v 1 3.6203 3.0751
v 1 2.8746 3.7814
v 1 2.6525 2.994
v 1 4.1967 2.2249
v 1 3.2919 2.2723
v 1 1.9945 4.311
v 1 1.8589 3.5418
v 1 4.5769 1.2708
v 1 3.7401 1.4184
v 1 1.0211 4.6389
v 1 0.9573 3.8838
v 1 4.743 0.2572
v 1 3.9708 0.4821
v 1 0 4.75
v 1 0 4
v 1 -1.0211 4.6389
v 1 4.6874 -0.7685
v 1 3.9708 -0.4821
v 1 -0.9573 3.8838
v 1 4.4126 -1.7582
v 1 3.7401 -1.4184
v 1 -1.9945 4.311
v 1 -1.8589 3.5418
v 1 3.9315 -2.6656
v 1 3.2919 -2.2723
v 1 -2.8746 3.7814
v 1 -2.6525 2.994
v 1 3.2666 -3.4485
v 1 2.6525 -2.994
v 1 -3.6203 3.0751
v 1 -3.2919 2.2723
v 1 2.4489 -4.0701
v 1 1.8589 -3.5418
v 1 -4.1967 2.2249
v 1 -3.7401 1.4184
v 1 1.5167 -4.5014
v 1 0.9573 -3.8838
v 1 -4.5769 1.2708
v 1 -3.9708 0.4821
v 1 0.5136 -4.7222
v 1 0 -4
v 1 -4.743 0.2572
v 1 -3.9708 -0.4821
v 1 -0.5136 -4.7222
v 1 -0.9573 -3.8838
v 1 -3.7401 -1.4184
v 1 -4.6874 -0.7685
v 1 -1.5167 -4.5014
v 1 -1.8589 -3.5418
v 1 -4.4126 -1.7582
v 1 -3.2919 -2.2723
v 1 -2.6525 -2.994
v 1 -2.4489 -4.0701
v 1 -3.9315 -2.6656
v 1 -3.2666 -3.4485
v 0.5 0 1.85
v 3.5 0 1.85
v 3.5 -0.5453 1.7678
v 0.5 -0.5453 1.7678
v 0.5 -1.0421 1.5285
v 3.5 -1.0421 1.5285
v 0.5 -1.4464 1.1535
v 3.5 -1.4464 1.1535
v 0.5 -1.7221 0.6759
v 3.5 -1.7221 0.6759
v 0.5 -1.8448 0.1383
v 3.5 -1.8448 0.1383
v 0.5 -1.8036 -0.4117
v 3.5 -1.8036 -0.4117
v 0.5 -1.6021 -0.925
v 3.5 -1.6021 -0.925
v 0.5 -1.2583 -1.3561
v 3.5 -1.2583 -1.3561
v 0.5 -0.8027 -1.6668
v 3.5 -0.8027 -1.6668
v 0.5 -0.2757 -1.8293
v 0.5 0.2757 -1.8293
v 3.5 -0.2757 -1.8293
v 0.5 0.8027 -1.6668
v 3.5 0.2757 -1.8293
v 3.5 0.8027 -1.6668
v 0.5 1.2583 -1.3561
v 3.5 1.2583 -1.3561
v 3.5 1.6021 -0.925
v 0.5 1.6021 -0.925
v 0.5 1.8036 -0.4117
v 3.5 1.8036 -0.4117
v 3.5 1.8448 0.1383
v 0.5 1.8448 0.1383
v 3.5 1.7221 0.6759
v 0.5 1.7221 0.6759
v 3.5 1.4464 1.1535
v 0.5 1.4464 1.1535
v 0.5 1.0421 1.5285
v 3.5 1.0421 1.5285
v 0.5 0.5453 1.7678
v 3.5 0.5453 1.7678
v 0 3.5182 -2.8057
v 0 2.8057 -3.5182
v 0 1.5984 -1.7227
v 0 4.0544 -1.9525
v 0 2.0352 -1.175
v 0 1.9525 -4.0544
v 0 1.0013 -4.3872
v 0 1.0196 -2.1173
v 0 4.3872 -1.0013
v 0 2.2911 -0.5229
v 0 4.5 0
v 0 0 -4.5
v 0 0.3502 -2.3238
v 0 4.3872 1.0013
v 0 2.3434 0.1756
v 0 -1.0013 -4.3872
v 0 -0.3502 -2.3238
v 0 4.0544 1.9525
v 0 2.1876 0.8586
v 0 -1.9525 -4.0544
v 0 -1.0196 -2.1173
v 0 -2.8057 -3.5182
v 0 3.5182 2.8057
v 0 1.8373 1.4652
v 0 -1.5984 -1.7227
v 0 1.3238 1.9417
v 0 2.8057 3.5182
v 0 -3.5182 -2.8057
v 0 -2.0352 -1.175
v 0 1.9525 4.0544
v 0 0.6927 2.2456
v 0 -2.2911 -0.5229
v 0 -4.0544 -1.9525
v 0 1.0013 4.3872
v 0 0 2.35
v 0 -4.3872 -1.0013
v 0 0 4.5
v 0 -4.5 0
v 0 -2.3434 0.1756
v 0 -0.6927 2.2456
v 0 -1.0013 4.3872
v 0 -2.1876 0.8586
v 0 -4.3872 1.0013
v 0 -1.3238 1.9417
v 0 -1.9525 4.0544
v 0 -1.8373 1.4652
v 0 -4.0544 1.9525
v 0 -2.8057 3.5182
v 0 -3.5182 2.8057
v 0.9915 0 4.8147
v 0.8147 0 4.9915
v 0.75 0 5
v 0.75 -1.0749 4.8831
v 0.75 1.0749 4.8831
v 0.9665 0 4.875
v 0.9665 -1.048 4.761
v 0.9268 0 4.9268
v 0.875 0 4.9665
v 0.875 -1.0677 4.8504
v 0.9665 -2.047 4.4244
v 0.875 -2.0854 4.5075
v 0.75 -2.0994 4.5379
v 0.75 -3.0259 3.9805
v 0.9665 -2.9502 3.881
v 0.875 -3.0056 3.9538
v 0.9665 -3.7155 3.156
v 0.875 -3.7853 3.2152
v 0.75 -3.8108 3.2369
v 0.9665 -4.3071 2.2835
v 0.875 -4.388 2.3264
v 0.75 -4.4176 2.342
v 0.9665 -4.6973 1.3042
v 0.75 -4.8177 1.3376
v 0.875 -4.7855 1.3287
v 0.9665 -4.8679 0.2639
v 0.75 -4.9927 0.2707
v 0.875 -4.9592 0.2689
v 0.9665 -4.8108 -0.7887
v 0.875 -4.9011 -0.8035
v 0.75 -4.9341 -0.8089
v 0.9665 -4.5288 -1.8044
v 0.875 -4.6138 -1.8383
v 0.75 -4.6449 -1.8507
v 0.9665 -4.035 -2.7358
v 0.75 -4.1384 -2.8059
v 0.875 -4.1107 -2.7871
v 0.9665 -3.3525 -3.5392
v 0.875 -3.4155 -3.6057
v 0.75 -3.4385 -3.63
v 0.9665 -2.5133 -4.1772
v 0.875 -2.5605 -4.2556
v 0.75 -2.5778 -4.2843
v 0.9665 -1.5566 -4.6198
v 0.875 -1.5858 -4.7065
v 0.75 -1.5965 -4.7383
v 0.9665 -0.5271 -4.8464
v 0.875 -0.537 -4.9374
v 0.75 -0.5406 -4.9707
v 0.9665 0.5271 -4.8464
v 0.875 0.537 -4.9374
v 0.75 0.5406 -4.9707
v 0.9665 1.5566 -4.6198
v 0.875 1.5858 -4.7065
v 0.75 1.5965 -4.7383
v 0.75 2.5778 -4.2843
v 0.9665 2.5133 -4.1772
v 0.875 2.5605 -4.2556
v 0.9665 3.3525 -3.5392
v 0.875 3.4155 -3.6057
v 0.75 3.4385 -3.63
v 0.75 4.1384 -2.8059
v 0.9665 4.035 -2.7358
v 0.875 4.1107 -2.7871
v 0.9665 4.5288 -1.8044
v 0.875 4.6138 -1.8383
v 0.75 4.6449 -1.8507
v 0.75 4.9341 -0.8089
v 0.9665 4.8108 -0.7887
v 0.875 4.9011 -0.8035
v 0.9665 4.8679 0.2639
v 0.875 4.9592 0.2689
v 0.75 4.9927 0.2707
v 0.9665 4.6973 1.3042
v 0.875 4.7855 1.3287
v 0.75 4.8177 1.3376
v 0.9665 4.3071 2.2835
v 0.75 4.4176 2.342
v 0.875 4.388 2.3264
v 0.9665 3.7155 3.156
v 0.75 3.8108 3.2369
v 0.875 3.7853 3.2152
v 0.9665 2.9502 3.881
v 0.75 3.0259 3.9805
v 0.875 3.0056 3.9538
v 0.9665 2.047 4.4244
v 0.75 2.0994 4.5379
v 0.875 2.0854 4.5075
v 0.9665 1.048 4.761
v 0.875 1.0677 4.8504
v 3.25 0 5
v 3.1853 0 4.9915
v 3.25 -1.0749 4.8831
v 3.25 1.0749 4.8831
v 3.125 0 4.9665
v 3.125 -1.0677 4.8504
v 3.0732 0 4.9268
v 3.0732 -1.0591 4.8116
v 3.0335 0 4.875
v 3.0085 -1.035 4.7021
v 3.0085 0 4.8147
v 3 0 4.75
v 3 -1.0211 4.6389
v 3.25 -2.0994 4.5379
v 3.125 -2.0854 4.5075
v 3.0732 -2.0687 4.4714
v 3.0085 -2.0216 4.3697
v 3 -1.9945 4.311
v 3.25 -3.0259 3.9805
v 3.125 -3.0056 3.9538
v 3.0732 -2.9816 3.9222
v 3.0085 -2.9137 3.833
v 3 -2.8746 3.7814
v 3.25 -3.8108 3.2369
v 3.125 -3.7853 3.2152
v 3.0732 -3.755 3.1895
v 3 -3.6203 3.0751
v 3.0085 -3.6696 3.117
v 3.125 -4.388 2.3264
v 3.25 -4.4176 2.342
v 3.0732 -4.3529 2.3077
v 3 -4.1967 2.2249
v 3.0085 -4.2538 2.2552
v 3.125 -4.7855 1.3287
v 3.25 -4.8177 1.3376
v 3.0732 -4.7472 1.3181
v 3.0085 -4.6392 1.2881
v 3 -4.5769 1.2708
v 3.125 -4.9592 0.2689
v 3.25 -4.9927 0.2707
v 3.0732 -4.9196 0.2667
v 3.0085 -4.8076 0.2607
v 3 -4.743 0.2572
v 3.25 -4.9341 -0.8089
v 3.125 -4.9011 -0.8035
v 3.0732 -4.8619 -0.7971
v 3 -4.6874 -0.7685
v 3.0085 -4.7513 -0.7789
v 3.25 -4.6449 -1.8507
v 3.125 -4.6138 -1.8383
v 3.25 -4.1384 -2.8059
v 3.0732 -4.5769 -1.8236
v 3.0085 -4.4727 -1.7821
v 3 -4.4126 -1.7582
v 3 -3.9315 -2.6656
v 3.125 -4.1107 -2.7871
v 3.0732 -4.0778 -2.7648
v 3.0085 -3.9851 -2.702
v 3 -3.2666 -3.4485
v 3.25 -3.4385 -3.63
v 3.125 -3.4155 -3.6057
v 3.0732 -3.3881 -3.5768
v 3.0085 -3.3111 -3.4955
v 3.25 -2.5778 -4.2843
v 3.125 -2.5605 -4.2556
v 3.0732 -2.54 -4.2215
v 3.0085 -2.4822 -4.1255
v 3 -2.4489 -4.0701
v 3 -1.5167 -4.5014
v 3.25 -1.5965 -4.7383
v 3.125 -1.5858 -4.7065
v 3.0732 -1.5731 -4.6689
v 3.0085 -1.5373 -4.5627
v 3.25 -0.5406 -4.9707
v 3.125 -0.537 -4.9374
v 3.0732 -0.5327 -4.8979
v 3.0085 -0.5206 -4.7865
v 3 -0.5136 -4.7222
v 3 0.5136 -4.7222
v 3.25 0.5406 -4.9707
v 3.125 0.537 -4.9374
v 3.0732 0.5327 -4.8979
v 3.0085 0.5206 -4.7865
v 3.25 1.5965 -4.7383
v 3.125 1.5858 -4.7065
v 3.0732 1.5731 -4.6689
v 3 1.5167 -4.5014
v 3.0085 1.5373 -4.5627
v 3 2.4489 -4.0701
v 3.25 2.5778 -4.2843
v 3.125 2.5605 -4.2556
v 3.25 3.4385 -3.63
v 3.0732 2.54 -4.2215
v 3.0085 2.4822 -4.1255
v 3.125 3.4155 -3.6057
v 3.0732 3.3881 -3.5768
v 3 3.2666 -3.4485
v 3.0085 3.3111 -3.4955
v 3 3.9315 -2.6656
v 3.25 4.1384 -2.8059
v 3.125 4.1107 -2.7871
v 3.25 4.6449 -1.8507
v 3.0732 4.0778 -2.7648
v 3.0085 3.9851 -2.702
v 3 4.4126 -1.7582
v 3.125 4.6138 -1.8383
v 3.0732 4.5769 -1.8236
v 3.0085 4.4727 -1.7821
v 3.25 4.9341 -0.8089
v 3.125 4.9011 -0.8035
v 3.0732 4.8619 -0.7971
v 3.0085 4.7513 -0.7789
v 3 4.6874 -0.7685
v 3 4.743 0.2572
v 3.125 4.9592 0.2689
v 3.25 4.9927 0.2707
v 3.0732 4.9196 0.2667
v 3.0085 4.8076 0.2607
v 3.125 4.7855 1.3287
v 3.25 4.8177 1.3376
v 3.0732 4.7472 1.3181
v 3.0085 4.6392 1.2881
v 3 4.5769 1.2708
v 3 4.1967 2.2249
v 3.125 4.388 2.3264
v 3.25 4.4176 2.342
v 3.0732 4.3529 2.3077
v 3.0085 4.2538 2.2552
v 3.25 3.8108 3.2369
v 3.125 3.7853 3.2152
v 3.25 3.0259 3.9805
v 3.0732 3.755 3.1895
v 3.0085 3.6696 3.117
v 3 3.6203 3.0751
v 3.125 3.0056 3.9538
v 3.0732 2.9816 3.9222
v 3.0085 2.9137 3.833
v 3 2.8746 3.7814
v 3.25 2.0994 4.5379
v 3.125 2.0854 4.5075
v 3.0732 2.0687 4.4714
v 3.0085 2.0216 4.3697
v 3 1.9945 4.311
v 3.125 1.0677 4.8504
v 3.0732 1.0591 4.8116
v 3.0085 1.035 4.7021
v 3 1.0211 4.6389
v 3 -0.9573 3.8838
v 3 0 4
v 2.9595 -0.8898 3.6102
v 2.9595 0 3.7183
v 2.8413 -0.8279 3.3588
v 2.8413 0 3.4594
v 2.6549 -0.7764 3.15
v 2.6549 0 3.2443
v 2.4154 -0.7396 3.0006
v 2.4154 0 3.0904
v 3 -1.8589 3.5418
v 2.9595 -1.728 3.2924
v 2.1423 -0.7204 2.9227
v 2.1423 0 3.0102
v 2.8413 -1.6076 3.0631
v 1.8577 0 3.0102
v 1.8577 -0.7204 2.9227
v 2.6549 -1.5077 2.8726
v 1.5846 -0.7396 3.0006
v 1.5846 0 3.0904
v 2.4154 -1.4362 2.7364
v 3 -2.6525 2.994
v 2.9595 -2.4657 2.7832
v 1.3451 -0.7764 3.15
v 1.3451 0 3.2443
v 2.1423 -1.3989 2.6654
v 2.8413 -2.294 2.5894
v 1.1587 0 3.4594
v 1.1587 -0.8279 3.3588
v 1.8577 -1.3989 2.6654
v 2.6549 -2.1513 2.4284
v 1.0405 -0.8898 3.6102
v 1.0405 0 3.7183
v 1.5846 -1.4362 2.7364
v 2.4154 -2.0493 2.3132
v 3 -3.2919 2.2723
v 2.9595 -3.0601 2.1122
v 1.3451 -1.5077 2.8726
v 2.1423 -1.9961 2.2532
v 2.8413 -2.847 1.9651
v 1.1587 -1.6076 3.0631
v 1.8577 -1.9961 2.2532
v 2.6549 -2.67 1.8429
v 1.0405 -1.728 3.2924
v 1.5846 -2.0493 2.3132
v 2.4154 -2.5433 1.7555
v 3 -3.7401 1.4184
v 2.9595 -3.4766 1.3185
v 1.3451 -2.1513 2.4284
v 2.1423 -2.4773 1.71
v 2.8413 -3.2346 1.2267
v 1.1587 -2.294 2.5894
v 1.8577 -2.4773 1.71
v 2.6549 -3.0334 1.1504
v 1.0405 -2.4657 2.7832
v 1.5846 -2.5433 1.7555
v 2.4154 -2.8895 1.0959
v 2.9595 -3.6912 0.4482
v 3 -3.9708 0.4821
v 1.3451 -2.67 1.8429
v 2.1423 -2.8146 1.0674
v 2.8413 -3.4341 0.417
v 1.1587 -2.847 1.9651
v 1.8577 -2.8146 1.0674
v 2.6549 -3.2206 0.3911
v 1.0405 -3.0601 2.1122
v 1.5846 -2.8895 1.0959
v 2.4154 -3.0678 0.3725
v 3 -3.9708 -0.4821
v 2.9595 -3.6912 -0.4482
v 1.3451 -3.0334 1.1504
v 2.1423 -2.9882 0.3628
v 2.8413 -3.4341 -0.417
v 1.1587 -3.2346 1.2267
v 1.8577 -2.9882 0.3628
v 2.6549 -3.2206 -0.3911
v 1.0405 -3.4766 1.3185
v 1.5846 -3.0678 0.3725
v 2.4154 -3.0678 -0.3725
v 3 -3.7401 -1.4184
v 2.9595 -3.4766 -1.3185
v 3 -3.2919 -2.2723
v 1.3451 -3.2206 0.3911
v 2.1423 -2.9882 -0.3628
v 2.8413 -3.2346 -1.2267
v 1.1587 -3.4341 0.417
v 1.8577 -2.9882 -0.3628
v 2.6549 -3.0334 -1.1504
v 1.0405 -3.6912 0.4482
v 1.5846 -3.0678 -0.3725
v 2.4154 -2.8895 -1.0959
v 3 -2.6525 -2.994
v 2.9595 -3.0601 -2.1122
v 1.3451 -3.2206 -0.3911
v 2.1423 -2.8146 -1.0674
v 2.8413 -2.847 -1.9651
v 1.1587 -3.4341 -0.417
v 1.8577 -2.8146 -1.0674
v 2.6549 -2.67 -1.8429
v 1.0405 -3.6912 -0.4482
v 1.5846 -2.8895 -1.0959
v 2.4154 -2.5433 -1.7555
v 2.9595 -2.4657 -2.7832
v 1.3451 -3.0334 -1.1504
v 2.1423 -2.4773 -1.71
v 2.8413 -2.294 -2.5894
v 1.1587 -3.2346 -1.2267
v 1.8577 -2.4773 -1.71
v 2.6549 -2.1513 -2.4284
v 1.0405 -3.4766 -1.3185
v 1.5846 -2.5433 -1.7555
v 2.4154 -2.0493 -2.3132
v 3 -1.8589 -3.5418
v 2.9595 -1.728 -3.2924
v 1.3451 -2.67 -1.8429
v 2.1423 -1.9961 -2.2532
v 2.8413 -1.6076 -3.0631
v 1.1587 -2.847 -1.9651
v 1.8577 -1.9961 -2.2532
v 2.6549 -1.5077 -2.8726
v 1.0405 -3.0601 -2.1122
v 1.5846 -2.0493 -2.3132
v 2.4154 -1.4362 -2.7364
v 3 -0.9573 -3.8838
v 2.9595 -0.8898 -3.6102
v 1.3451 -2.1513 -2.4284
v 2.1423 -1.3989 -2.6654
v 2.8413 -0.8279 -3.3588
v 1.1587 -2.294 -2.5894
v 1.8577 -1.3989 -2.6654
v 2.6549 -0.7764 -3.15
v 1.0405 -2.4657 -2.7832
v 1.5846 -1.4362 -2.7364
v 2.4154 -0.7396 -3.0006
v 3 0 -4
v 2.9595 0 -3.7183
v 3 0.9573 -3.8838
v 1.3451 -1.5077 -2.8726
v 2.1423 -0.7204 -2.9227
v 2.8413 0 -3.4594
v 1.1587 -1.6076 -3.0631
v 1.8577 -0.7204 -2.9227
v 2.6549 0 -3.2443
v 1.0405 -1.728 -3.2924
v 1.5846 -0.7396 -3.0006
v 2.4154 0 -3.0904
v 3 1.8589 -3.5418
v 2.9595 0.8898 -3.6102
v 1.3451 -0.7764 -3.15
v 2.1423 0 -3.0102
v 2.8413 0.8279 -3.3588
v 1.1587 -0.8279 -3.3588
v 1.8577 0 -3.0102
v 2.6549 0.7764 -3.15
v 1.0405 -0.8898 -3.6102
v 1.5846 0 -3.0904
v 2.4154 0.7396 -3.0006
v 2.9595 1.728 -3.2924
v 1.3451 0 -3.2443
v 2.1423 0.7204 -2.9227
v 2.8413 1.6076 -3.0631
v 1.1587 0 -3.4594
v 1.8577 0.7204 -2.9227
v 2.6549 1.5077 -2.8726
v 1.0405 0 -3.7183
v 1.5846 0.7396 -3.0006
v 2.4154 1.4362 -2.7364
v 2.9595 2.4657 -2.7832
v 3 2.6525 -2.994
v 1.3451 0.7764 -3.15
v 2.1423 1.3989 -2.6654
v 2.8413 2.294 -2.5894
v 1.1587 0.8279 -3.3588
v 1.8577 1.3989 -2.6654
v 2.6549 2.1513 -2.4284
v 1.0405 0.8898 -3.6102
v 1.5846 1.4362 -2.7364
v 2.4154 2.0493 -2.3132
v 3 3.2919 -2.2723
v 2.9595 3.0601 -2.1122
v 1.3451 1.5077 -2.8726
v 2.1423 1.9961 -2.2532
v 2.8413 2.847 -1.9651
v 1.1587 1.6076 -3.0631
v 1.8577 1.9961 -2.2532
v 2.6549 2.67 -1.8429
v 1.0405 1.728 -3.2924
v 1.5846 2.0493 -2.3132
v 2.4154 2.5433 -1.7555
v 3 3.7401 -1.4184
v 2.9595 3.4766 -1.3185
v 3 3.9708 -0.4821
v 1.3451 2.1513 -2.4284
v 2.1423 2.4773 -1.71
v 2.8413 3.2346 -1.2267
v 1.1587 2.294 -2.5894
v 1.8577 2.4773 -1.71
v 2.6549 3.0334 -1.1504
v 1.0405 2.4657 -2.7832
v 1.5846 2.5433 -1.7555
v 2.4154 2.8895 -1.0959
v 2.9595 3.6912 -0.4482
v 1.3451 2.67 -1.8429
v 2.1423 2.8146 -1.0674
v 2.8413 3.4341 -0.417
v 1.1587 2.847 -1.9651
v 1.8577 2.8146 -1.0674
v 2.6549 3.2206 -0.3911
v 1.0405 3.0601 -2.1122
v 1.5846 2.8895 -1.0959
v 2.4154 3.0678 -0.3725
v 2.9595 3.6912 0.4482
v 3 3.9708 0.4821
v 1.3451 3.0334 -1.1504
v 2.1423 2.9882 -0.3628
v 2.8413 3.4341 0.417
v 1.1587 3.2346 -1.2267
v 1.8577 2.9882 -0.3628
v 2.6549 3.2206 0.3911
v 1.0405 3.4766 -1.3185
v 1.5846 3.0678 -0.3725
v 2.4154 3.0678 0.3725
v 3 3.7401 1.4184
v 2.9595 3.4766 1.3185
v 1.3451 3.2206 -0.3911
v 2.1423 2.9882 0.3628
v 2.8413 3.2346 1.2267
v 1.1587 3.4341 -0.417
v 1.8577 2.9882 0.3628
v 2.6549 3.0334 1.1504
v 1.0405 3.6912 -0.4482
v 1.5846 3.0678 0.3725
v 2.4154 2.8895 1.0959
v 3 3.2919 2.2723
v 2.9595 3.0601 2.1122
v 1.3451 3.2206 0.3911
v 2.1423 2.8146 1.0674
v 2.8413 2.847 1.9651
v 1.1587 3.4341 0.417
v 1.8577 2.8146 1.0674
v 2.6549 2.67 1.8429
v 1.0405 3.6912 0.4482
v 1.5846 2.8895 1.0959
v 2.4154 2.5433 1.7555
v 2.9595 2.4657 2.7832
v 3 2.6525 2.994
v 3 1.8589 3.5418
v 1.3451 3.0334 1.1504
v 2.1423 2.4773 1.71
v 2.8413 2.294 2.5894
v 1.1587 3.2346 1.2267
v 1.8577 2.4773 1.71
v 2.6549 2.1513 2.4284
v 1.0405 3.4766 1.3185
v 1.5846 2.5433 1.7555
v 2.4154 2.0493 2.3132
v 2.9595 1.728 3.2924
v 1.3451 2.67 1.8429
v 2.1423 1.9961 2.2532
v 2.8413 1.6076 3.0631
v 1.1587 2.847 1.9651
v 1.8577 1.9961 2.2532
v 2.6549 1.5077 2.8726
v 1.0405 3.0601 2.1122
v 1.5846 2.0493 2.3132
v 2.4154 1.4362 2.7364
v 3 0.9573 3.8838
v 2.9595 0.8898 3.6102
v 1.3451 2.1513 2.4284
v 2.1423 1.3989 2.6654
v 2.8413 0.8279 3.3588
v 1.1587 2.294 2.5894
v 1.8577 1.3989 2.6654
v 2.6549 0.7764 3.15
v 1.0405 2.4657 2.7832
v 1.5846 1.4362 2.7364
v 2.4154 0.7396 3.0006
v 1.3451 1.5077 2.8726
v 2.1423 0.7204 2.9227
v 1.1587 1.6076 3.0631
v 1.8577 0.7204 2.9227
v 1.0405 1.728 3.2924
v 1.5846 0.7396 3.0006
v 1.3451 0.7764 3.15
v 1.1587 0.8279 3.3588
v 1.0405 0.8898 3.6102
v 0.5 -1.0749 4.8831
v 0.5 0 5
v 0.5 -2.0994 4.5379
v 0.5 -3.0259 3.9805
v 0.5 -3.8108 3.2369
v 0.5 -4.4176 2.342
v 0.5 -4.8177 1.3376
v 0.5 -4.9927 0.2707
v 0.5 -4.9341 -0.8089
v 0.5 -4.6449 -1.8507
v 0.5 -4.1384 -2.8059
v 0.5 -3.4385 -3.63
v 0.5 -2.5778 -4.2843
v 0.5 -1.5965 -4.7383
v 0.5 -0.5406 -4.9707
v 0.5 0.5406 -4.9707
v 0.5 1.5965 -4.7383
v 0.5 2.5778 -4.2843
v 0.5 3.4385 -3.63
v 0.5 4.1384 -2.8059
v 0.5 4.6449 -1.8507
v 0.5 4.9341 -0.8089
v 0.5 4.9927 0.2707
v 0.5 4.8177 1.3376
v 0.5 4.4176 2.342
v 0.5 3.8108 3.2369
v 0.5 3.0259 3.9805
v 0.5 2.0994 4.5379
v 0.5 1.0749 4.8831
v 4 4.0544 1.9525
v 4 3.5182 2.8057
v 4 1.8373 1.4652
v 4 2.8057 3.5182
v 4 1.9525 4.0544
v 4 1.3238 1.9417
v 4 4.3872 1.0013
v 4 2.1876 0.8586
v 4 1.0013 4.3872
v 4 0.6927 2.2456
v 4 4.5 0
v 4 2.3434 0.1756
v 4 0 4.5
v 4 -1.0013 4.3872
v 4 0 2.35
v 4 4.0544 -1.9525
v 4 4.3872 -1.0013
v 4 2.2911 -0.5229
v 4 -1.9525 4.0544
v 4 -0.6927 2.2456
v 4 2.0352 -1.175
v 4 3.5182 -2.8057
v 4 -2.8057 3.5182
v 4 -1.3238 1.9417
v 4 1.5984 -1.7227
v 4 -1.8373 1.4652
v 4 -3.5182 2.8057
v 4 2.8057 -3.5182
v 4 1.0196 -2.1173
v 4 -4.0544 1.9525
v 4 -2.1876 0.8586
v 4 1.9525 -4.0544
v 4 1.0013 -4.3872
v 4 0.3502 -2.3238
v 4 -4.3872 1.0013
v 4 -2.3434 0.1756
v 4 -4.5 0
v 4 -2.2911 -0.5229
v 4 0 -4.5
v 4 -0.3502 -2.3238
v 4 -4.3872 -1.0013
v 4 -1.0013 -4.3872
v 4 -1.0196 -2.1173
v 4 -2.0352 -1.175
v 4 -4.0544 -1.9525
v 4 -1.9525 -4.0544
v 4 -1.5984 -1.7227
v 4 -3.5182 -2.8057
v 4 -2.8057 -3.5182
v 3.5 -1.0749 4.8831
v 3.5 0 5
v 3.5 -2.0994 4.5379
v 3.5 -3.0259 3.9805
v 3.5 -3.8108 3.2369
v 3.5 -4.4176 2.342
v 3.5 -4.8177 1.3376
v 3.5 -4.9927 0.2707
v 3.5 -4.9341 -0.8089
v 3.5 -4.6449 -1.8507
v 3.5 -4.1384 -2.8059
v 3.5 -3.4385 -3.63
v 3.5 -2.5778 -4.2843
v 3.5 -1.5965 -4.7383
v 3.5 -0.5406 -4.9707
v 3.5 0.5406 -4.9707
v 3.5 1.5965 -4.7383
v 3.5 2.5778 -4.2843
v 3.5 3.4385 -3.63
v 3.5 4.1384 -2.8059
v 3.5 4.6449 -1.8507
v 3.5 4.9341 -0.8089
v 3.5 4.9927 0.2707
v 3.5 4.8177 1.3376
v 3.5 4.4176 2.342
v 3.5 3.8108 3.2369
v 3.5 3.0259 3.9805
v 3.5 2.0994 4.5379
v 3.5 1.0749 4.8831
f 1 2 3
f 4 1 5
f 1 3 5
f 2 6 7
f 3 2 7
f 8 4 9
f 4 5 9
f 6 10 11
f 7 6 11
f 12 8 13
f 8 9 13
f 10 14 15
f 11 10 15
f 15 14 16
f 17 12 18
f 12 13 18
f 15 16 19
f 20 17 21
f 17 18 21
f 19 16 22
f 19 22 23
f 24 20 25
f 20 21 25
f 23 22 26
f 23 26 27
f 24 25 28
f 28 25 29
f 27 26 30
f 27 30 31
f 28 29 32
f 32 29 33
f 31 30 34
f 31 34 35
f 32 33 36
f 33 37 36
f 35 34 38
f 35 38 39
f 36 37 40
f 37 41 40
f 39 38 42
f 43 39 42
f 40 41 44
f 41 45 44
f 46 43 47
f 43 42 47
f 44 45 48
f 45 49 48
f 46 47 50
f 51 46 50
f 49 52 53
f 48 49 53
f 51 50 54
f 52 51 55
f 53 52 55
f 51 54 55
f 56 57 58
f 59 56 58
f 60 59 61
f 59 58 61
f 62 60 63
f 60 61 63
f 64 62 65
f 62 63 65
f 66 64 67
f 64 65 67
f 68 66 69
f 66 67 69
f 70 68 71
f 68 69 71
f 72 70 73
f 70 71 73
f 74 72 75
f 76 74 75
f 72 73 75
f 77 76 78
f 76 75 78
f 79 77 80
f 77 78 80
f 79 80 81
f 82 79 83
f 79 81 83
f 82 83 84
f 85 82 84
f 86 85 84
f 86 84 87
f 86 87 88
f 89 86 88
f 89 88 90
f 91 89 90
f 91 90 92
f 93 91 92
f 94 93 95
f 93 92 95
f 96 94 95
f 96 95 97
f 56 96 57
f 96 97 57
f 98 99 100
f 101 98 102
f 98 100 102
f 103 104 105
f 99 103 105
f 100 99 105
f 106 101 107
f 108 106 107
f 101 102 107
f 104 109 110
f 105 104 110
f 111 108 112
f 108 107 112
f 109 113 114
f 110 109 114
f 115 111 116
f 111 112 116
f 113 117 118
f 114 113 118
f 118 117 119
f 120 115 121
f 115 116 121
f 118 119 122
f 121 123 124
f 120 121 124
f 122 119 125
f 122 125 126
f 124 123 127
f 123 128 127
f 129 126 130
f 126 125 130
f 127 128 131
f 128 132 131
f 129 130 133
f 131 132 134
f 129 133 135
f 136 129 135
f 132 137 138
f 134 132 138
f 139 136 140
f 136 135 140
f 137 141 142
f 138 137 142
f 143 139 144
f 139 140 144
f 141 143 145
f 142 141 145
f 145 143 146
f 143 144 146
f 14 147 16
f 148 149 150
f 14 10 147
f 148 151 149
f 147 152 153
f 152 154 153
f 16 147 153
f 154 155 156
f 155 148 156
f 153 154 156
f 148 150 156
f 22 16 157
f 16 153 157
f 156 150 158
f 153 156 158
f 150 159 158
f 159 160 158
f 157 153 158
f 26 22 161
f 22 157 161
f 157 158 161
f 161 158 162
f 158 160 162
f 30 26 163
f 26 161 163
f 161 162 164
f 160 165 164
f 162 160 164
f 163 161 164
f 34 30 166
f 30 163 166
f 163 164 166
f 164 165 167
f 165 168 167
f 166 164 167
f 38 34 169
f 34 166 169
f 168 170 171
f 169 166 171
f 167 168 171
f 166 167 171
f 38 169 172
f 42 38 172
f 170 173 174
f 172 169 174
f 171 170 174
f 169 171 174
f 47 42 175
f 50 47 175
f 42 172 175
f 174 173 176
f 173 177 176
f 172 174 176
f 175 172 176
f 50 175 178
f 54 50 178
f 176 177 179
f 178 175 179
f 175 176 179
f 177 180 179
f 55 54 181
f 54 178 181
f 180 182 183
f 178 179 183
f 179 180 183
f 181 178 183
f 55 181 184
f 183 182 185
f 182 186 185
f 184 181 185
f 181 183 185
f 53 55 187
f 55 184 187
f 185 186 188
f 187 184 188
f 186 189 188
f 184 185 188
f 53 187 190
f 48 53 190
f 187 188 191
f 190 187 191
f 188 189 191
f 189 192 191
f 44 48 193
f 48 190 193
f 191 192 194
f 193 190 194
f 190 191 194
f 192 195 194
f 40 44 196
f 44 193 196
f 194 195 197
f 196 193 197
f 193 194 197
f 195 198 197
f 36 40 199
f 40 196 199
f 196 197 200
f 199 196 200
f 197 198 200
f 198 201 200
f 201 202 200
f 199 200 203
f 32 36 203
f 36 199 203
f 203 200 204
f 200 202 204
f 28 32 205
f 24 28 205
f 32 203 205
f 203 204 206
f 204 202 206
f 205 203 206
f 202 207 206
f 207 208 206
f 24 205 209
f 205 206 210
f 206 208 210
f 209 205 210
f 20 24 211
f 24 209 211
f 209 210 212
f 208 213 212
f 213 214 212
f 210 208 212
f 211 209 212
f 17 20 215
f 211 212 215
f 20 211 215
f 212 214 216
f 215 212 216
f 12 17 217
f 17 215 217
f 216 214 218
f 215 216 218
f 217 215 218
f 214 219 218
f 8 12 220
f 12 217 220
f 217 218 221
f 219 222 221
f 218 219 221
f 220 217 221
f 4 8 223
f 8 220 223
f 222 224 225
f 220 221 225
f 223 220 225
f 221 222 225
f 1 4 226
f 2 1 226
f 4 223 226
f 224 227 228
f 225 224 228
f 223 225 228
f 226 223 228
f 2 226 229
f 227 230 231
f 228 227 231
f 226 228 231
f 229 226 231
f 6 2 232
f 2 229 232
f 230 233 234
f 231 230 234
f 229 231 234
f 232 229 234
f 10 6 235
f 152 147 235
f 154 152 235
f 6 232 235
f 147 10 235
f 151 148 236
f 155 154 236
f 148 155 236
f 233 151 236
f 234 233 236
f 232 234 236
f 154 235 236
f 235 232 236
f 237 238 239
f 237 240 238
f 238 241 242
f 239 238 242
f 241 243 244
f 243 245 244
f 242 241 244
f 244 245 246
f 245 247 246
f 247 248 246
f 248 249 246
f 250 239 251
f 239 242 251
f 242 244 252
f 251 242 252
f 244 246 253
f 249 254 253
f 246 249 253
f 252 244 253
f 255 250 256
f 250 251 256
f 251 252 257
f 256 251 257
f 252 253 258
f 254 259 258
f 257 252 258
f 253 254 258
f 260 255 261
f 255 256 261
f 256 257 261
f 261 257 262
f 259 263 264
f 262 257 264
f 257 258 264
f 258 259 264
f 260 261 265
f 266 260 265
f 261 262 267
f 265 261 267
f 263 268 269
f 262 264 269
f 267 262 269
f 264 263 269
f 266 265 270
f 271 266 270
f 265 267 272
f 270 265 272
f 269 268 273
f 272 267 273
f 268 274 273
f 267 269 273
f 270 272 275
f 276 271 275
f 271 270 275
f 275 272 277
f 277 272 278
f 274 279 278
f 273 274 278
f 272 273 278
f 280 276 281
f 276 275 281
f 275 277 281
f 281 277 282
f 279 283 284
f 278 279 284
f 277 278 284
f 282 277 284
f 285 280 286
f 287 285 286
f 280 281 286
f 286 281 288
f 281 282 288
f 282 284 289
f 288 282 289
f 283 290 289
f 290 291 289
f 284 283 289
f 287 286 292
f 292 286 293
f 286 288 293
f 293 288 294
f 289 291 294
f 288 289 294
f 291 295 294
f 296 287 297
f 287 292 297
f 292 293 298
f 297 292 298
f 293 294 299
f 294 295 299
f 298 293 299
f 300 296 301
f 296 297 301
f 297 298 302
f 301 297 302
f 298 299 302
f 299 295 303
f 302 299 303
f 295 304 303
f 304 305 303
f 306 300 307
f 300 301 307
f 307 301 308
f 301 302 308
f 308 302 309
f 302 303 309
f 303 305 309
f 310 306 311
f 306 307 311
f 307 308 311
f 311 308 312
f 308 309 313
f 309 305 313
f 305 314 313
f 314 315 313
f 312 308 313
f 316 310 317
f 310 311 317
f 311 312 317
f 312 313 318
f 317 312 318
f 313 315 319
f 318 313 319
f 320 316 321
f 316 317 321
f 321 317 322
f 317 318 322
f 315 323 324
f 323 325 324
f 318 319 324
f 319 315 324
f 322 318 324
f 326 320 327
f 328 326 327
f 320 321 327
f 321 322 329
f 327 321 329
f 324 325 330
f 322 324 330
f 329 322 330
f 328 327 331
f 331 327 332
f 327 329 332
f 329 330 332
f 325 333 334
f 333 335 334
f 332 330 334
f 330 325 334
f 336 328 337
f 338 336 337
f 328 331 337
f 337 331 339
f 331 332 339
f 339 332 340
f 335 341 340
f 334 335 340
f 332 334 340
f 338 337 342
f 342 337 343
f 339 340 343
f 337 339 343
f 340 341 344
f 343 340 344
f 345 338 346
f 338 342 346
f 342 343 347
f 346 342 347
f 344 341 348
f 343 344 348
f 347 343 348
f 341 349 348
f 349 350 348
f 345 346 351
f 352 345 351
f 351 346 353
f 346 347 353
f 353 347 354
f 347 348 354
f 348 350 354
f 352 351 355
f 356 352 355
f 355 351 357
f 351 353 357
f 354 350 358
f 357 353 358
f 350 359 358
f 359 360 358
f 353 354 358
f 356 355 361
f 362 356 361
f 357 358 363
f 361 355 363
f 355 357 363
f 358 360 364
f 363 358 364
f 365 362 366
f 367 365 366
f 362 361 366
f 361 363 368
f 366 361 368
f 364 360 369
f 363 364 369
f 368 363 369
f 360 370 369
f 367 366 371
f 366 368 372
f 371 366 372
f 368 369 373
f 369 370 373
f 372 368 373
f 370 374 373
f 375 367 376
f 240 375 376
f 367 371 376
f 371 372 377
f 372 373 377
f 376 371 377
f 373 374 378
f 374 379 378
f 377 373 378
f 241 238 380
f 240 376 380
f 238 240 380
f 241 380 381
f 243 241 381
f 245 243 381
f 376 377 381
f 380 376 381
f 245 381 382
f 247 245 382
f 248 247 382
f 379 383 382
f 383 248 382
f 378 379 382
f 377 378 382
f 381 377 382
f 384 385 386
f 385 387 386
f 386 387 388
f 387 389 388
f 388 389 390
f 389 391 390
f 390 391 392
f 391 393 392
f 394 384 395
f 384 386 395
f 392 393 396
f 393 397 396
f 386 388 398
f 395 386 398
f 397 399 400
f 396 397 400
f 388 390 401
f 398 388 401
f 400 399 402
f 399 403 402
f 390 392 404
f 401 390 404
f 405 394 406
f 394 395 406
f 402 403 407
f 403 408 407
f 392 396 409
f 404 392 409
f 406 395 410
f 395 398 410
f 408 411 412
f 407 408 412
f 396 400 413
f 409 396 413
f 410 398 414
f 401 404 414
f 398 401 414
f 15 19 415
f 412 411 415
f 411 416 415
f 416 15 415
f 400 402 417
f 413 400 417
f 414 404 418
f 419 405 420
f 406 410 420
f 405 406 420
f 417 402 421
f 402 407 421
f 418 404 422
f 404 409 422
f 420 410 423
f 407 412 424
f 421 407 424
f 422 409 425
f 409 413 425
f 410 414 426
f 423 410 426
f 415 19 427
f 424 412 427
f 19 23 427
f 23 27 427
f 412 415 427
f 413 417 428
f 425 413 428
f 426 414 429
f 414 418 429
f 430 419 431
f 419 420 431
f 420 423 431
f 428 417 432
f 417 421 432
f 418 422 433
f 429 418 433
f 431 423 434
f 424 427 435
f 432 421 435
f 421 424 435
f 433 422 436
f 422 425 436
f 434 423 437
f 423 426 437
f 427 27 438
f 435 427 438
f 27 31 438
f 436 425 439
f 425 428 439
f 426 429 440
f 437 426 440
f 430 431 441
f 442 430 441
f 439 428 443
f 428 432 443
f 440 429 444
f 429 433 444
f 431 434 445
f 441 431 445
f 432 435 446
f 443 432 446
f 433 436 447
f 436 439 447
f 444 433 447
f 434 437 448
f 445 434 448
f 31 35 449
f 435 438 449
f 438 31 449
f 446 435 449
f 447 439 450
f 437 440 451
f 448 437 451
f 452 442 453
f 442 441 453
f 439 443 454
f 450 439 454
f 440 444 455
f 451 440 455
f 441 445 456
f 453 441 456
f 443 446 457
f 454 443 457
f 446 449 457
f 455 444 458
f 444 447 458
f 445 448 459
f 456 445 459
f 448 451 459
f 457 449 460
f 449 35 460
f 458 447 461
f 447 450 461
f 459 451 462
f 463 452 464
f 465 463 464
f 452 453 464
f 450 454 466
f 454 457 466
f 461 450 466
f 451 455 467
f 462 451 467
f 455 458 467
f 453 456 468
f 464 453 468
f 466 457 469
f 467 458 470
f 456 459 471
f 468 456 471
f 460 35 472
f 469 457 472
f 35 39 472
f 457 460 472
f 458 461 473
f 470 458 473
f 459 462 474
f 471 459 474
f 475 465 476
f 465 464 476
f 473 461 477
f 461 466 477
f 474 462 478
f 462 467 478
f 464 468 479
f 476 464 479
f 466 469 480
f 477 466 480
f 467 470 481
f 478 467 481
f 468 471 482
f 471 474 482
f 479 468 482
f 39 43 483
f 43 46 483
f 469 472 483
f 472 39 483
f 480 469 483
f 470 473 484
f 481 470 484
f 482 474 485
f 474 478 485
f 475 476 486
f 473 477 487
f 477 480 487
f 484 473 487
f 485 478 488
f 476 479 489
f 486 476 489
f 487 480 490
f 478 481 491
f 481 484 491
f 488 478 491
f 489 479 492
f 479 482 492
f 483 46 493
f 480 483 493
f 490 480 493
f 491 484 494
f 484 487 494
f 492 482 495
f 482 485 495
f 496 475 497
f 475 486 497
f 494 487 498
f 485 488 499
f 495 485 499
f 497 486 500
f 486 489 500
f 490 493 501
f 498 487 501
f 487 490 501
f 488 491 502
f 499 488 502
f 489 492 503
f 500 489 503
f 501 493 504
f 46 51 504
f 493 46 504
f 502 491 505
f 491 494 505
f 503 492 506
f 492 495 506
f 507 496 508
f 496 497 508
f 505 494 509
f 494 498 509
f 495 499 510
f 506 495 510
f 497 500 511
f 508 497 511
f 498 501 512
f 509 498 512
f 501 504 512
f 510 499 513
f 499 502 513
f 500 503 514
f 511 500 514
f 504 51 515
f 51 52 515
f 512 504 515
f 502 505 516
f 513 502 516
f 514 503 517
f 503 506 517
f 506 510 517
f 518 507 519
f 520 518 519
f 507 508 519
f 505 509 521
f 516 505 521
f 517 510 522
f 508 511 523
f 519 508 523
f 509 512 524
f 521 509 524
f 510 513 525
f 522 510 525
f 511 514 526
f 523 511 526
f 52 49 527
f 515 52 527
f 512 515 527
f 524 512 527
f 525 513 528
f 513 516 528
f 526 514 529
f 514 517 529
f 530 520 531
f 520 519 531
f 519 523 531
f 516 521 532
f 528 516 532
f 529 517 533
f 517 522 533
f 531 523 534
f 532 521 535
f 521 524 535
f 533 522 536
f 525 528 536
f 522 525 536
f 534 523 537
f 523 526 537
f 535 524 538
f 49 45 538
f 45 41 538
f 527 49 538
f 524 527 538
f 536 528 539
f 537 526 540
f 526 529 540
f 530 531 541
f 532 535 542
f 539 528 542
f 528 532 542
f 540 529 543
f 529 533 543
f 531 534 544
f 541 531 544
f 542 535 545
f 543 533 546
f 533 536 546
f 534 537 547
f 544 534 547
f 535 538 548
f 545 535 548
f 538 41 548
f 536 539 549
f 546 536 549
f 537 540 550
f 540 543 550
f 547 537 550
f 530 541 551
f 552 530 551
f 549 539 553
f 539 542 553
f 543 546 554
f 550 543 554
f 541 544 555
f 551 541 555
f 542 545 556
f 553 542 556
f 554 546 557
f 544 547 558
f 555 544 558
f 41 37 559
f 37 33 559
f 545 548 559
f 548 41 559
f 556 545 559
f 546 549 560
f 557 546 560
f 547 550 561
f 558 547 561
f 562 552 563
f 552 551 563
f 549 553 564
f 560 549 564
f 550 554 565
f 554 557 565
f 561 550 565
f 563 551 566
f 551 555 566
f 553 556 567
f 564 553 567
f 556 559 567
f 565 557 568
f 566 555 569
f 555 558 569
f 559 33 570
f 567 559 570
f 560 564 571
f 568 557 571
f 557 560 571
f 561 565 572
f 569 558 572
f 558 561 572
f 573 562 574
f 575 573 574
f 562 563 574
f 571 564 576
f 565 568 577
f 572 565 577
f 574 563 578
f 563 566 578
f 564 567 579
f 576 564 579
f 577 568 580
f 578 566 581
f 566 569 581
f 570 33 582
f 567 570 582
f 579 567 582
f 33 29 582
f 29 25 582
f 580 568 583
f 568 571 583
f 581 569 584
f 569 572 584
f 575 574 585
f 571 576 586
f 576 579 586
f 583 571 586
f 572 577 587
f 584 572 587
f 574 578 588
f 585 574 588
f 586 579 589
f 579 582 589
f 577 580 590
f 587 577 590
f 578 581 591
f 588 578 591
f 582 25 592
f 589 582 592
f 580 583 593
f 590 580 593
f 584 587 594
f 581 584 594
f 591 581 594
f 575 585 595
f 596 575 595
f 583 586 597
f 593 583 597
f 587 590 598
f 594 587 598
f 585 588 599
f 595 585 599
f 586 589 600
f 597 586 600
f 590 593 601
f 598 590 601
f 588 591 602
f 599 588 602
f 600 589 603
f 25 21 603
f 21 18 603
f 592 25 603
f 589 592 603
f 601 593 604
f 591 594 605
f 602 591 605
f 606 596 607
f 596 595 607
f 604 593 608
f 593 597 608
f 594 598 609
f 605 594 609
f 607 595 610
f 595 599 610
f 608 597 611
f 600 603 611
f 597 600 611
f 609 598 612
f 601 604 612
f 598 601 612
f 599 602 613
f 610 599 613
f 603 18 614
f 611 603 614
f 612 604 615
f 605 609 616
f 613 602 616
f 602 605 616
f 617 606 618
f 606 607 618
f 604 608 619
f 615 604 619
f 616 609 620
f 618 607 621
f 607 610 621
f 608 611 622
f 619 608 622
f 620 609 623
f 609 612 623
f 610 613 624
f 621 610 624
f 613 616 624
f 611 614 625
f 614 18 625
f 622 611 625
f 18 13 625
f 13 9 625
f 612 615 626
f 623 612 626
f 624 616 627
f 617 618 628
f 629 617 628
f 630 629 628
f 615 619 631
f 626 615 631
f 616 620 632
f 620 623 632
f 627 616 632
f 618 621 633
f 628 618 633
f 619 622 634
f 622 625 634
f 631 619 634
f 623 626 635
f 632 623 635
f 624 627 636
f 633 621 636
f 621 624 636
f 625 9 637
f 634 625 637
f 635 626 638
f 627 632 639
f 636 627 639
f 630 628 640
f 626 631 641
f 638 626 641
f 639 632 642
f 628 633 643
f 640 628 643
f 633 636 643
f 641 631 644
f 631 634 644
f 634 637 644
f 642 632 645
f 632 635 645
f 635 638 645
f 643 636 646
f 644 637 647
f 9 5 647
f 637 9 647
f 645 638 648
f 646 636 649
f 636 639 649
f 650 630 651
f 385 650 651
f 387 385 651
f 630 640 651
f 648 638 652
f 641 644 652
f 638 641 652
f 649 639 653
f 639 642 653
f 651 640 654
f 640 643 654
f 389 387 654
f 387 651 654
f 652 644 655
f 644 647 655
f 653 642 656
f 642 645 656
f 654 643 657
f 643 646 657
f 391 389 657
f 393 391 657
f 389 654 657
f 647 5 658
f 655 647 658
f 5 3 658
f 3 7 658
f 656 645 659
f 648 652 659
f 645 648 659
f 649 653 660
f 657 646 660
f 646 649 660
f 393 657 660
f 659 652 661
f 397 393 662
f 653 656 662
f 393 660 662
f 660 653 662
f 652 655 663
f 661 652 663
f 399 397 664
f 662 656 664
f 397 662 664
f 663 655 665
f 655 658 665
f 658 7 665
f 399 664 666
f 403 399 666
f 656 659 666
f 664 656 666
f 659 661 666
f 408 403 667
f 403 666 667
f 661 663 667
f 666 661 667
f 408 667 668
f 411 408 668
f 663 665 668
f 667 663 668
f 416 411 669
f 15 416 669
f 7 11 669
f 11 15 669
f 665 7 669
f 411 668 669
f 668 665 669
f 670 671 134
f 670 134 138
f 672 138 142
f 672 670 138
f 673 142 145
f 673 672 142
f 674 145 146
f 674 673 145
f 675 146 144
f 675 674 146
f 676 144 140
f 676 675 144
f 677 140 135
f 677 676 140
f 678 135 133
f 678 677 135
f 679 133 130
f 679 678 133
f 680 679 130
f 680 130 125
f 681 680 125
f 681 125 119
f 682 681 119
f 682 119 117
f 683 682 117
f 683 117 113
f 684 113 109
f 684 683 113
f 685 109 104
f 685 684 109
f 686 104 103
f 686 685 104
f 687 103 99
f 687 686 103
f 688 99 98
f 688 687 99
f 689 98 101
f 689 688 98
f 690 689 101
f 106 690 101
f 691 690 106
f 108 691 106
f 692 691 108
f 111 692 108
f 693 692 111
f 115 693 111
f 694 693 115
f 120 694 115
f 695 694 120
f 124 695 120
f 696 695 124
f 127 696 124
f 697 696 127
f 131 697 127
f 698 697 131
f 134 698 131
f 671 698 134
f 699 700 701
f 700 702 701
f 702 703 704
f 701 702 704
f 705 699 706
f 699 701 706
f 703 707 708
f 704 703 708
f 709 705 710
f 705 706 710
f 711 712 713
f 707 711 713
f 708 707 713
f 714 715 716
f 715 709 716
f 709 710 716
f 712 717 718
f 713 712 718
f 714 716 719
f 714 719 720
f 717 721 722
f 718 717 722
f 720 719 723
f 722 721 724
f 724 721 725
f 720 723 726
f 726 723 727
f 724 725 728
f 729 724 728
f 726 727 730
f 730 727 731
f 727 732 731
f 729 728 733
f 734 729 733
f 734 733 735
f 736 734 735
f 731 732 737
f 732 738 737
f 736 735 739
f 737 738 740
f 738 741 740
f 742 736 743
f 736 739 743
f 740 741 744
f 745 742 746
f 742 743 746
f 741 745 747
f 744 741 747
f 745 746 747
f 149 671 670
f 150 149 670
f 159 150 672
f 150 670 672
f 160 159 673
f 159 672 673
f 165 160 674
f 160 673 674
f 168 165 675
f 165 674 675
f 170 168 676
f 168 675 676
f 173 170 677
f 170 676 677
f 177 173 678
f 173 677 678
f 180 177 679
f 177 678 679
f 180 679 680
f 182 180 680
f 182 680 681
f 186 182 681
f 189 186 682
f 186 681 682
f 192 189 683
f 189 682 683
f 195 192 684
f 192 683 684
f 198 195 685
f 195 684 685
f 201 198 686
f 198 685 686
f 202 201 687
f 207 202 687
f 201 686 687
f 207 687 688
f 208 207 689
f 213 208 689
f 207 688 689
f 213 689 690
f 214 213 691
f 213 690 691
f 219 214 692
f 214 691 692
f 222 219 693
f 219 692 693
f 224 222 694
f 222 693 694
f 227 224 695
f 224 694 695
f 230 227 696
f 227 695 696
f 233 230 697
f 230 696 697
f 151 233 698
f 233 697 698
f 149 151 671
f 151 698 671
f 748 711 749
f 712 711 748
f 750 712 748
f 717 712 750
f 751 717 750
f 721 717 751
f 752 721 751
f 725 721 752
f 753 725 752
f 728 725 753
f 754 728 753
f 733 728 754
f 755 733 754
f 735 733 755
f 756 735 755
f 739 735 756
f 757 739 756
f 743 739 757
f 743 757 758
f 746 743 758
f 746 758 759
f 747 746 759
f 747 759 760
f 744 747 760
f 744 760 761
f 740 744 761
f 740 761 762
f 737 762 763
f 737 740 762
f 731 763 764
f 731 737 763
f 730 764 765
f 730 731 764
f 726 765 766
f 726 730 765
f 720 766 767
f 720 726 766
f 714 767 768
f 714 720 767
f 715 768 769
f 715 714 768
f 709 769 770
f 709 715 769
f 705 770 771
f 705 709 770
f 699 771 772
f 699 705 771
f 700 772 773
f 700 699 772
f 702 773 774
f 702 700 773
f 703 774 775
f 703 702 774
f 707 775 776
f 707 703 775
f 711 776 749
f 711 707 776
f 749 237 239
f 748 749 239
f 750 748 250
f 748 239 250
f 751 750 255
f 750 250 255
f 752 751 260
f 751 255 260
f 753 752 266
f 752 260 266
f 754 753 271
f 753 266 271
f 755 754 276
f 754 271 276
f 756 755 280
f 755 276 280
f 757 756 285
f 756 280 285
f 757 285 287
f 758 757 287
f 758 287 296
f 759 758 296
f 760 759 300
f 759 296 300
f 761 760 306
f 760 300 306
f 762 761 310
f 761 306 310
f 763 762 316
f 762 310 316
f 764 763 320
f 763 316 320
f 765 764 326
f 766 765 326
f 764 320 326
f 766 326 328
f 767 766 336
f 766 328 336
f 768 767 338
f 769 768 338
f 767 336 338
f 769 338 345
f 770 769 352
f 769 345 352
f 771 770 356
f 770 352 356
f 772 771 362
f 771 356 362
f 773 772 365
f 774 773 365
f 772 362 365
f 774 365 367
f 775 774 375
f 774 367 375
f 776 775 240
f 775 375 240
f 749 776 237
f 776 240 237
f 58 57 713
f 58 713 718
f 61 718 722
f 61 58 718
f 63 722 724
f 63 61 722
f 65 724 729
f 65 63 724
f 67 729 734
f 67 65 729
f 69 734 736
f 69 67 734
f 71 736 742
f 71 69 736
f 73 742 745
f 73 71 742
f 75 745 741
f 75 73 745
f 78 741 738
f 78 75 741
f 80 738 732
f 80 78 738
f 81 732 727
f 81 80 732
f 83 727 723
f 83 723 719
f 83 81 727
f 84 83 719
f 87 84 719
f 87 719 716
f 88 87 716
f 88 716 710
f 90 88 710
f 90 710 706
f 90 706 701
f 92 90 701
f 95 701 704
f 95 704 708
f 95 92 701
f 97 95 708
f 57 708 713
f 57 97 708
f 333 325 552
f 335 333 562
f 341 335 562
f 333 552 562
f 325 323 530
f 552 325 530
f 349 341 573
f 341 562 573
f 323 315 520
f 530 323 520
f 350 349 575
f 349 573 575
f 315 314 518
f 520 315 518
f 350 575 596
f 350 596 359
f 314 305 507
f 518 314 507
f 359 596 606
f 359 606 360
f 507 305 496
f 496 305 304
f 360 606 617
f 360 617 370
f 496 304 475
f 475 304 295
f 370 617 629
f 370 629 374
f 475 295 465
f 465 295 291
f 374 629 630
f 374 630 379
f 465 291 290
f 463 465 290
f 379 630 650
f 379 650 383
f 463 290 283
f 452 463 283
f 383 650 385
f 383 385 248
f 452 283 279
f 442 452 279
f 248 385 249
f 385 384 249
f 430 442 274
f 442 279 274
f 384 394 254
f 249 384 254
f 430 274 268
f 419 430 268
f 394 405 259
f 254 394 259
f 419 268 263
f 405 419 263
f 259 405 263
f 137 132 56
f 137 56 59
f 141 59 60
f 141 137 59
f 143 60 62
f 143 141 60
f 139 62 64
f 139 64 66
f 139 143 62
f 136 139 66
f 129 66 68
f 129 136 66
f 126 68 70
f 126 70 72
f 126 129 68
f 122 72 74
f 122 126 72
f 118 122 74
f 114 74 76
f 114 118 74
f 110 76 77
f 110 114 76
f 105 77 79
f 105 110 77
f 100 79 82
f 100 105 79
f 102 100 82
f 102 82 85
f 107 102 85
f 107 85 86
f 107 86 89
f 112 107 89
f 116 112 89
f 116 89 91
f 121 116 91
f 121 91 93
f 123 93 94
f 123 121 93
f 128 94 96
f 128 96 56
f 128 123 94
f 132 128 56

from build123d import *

# Parameters (mm, degrees)
FILLET1_R     = 0.25
CHAMFER1_SIZE = 0.5


with BuildPart() as part:
    # Sketch1 → Revolve1 (revolve)
    with BuildSketch(Plane.XY, mode=Mode.PRIVATE) as revolve1_sk:
        with BuildLine():
            Line((0, 5), (0, 1.85))
            Line((0, 1.85), (4, 1.85))
            Line((4, 1.85), (4, 5))
            Line((4, 5), (3, 5))
            Line((3, 5), (3, 4))
            ThreePointArc((3, 4), (2, 3), (1, 4))
            Line((1, 4), (1, 5))
            Line((1, 5), (0, 5))
        make_face()
    revolve(revolve1_sk.sketch.rotate(Axis((0, 0, 0), (1, 0, 0)), 90), axis=Axis((0, 0, 0), (1, 0, 0)))

    # Fillet1
    fillet1_edges = [part.edges().sort_by_distance(p)[0] for p in [
        (1, 0, -5),
        (3, 0, -5),
    ]]
    fillet(fillet1_edges, radius=FILLET1_R)

    # Chamfer1
    chamfer1_edges = [part.edges().sort_by_distance(p)[0] for p in [
        (0, 0, -5),
        (4, 0, -5),
        (4, 0, -1.85),
        (0, 0, -1.85),
    ]]
    chamfer(chamfer1_edges, length=CHAMFER1_SIZE)


solid = part.part
